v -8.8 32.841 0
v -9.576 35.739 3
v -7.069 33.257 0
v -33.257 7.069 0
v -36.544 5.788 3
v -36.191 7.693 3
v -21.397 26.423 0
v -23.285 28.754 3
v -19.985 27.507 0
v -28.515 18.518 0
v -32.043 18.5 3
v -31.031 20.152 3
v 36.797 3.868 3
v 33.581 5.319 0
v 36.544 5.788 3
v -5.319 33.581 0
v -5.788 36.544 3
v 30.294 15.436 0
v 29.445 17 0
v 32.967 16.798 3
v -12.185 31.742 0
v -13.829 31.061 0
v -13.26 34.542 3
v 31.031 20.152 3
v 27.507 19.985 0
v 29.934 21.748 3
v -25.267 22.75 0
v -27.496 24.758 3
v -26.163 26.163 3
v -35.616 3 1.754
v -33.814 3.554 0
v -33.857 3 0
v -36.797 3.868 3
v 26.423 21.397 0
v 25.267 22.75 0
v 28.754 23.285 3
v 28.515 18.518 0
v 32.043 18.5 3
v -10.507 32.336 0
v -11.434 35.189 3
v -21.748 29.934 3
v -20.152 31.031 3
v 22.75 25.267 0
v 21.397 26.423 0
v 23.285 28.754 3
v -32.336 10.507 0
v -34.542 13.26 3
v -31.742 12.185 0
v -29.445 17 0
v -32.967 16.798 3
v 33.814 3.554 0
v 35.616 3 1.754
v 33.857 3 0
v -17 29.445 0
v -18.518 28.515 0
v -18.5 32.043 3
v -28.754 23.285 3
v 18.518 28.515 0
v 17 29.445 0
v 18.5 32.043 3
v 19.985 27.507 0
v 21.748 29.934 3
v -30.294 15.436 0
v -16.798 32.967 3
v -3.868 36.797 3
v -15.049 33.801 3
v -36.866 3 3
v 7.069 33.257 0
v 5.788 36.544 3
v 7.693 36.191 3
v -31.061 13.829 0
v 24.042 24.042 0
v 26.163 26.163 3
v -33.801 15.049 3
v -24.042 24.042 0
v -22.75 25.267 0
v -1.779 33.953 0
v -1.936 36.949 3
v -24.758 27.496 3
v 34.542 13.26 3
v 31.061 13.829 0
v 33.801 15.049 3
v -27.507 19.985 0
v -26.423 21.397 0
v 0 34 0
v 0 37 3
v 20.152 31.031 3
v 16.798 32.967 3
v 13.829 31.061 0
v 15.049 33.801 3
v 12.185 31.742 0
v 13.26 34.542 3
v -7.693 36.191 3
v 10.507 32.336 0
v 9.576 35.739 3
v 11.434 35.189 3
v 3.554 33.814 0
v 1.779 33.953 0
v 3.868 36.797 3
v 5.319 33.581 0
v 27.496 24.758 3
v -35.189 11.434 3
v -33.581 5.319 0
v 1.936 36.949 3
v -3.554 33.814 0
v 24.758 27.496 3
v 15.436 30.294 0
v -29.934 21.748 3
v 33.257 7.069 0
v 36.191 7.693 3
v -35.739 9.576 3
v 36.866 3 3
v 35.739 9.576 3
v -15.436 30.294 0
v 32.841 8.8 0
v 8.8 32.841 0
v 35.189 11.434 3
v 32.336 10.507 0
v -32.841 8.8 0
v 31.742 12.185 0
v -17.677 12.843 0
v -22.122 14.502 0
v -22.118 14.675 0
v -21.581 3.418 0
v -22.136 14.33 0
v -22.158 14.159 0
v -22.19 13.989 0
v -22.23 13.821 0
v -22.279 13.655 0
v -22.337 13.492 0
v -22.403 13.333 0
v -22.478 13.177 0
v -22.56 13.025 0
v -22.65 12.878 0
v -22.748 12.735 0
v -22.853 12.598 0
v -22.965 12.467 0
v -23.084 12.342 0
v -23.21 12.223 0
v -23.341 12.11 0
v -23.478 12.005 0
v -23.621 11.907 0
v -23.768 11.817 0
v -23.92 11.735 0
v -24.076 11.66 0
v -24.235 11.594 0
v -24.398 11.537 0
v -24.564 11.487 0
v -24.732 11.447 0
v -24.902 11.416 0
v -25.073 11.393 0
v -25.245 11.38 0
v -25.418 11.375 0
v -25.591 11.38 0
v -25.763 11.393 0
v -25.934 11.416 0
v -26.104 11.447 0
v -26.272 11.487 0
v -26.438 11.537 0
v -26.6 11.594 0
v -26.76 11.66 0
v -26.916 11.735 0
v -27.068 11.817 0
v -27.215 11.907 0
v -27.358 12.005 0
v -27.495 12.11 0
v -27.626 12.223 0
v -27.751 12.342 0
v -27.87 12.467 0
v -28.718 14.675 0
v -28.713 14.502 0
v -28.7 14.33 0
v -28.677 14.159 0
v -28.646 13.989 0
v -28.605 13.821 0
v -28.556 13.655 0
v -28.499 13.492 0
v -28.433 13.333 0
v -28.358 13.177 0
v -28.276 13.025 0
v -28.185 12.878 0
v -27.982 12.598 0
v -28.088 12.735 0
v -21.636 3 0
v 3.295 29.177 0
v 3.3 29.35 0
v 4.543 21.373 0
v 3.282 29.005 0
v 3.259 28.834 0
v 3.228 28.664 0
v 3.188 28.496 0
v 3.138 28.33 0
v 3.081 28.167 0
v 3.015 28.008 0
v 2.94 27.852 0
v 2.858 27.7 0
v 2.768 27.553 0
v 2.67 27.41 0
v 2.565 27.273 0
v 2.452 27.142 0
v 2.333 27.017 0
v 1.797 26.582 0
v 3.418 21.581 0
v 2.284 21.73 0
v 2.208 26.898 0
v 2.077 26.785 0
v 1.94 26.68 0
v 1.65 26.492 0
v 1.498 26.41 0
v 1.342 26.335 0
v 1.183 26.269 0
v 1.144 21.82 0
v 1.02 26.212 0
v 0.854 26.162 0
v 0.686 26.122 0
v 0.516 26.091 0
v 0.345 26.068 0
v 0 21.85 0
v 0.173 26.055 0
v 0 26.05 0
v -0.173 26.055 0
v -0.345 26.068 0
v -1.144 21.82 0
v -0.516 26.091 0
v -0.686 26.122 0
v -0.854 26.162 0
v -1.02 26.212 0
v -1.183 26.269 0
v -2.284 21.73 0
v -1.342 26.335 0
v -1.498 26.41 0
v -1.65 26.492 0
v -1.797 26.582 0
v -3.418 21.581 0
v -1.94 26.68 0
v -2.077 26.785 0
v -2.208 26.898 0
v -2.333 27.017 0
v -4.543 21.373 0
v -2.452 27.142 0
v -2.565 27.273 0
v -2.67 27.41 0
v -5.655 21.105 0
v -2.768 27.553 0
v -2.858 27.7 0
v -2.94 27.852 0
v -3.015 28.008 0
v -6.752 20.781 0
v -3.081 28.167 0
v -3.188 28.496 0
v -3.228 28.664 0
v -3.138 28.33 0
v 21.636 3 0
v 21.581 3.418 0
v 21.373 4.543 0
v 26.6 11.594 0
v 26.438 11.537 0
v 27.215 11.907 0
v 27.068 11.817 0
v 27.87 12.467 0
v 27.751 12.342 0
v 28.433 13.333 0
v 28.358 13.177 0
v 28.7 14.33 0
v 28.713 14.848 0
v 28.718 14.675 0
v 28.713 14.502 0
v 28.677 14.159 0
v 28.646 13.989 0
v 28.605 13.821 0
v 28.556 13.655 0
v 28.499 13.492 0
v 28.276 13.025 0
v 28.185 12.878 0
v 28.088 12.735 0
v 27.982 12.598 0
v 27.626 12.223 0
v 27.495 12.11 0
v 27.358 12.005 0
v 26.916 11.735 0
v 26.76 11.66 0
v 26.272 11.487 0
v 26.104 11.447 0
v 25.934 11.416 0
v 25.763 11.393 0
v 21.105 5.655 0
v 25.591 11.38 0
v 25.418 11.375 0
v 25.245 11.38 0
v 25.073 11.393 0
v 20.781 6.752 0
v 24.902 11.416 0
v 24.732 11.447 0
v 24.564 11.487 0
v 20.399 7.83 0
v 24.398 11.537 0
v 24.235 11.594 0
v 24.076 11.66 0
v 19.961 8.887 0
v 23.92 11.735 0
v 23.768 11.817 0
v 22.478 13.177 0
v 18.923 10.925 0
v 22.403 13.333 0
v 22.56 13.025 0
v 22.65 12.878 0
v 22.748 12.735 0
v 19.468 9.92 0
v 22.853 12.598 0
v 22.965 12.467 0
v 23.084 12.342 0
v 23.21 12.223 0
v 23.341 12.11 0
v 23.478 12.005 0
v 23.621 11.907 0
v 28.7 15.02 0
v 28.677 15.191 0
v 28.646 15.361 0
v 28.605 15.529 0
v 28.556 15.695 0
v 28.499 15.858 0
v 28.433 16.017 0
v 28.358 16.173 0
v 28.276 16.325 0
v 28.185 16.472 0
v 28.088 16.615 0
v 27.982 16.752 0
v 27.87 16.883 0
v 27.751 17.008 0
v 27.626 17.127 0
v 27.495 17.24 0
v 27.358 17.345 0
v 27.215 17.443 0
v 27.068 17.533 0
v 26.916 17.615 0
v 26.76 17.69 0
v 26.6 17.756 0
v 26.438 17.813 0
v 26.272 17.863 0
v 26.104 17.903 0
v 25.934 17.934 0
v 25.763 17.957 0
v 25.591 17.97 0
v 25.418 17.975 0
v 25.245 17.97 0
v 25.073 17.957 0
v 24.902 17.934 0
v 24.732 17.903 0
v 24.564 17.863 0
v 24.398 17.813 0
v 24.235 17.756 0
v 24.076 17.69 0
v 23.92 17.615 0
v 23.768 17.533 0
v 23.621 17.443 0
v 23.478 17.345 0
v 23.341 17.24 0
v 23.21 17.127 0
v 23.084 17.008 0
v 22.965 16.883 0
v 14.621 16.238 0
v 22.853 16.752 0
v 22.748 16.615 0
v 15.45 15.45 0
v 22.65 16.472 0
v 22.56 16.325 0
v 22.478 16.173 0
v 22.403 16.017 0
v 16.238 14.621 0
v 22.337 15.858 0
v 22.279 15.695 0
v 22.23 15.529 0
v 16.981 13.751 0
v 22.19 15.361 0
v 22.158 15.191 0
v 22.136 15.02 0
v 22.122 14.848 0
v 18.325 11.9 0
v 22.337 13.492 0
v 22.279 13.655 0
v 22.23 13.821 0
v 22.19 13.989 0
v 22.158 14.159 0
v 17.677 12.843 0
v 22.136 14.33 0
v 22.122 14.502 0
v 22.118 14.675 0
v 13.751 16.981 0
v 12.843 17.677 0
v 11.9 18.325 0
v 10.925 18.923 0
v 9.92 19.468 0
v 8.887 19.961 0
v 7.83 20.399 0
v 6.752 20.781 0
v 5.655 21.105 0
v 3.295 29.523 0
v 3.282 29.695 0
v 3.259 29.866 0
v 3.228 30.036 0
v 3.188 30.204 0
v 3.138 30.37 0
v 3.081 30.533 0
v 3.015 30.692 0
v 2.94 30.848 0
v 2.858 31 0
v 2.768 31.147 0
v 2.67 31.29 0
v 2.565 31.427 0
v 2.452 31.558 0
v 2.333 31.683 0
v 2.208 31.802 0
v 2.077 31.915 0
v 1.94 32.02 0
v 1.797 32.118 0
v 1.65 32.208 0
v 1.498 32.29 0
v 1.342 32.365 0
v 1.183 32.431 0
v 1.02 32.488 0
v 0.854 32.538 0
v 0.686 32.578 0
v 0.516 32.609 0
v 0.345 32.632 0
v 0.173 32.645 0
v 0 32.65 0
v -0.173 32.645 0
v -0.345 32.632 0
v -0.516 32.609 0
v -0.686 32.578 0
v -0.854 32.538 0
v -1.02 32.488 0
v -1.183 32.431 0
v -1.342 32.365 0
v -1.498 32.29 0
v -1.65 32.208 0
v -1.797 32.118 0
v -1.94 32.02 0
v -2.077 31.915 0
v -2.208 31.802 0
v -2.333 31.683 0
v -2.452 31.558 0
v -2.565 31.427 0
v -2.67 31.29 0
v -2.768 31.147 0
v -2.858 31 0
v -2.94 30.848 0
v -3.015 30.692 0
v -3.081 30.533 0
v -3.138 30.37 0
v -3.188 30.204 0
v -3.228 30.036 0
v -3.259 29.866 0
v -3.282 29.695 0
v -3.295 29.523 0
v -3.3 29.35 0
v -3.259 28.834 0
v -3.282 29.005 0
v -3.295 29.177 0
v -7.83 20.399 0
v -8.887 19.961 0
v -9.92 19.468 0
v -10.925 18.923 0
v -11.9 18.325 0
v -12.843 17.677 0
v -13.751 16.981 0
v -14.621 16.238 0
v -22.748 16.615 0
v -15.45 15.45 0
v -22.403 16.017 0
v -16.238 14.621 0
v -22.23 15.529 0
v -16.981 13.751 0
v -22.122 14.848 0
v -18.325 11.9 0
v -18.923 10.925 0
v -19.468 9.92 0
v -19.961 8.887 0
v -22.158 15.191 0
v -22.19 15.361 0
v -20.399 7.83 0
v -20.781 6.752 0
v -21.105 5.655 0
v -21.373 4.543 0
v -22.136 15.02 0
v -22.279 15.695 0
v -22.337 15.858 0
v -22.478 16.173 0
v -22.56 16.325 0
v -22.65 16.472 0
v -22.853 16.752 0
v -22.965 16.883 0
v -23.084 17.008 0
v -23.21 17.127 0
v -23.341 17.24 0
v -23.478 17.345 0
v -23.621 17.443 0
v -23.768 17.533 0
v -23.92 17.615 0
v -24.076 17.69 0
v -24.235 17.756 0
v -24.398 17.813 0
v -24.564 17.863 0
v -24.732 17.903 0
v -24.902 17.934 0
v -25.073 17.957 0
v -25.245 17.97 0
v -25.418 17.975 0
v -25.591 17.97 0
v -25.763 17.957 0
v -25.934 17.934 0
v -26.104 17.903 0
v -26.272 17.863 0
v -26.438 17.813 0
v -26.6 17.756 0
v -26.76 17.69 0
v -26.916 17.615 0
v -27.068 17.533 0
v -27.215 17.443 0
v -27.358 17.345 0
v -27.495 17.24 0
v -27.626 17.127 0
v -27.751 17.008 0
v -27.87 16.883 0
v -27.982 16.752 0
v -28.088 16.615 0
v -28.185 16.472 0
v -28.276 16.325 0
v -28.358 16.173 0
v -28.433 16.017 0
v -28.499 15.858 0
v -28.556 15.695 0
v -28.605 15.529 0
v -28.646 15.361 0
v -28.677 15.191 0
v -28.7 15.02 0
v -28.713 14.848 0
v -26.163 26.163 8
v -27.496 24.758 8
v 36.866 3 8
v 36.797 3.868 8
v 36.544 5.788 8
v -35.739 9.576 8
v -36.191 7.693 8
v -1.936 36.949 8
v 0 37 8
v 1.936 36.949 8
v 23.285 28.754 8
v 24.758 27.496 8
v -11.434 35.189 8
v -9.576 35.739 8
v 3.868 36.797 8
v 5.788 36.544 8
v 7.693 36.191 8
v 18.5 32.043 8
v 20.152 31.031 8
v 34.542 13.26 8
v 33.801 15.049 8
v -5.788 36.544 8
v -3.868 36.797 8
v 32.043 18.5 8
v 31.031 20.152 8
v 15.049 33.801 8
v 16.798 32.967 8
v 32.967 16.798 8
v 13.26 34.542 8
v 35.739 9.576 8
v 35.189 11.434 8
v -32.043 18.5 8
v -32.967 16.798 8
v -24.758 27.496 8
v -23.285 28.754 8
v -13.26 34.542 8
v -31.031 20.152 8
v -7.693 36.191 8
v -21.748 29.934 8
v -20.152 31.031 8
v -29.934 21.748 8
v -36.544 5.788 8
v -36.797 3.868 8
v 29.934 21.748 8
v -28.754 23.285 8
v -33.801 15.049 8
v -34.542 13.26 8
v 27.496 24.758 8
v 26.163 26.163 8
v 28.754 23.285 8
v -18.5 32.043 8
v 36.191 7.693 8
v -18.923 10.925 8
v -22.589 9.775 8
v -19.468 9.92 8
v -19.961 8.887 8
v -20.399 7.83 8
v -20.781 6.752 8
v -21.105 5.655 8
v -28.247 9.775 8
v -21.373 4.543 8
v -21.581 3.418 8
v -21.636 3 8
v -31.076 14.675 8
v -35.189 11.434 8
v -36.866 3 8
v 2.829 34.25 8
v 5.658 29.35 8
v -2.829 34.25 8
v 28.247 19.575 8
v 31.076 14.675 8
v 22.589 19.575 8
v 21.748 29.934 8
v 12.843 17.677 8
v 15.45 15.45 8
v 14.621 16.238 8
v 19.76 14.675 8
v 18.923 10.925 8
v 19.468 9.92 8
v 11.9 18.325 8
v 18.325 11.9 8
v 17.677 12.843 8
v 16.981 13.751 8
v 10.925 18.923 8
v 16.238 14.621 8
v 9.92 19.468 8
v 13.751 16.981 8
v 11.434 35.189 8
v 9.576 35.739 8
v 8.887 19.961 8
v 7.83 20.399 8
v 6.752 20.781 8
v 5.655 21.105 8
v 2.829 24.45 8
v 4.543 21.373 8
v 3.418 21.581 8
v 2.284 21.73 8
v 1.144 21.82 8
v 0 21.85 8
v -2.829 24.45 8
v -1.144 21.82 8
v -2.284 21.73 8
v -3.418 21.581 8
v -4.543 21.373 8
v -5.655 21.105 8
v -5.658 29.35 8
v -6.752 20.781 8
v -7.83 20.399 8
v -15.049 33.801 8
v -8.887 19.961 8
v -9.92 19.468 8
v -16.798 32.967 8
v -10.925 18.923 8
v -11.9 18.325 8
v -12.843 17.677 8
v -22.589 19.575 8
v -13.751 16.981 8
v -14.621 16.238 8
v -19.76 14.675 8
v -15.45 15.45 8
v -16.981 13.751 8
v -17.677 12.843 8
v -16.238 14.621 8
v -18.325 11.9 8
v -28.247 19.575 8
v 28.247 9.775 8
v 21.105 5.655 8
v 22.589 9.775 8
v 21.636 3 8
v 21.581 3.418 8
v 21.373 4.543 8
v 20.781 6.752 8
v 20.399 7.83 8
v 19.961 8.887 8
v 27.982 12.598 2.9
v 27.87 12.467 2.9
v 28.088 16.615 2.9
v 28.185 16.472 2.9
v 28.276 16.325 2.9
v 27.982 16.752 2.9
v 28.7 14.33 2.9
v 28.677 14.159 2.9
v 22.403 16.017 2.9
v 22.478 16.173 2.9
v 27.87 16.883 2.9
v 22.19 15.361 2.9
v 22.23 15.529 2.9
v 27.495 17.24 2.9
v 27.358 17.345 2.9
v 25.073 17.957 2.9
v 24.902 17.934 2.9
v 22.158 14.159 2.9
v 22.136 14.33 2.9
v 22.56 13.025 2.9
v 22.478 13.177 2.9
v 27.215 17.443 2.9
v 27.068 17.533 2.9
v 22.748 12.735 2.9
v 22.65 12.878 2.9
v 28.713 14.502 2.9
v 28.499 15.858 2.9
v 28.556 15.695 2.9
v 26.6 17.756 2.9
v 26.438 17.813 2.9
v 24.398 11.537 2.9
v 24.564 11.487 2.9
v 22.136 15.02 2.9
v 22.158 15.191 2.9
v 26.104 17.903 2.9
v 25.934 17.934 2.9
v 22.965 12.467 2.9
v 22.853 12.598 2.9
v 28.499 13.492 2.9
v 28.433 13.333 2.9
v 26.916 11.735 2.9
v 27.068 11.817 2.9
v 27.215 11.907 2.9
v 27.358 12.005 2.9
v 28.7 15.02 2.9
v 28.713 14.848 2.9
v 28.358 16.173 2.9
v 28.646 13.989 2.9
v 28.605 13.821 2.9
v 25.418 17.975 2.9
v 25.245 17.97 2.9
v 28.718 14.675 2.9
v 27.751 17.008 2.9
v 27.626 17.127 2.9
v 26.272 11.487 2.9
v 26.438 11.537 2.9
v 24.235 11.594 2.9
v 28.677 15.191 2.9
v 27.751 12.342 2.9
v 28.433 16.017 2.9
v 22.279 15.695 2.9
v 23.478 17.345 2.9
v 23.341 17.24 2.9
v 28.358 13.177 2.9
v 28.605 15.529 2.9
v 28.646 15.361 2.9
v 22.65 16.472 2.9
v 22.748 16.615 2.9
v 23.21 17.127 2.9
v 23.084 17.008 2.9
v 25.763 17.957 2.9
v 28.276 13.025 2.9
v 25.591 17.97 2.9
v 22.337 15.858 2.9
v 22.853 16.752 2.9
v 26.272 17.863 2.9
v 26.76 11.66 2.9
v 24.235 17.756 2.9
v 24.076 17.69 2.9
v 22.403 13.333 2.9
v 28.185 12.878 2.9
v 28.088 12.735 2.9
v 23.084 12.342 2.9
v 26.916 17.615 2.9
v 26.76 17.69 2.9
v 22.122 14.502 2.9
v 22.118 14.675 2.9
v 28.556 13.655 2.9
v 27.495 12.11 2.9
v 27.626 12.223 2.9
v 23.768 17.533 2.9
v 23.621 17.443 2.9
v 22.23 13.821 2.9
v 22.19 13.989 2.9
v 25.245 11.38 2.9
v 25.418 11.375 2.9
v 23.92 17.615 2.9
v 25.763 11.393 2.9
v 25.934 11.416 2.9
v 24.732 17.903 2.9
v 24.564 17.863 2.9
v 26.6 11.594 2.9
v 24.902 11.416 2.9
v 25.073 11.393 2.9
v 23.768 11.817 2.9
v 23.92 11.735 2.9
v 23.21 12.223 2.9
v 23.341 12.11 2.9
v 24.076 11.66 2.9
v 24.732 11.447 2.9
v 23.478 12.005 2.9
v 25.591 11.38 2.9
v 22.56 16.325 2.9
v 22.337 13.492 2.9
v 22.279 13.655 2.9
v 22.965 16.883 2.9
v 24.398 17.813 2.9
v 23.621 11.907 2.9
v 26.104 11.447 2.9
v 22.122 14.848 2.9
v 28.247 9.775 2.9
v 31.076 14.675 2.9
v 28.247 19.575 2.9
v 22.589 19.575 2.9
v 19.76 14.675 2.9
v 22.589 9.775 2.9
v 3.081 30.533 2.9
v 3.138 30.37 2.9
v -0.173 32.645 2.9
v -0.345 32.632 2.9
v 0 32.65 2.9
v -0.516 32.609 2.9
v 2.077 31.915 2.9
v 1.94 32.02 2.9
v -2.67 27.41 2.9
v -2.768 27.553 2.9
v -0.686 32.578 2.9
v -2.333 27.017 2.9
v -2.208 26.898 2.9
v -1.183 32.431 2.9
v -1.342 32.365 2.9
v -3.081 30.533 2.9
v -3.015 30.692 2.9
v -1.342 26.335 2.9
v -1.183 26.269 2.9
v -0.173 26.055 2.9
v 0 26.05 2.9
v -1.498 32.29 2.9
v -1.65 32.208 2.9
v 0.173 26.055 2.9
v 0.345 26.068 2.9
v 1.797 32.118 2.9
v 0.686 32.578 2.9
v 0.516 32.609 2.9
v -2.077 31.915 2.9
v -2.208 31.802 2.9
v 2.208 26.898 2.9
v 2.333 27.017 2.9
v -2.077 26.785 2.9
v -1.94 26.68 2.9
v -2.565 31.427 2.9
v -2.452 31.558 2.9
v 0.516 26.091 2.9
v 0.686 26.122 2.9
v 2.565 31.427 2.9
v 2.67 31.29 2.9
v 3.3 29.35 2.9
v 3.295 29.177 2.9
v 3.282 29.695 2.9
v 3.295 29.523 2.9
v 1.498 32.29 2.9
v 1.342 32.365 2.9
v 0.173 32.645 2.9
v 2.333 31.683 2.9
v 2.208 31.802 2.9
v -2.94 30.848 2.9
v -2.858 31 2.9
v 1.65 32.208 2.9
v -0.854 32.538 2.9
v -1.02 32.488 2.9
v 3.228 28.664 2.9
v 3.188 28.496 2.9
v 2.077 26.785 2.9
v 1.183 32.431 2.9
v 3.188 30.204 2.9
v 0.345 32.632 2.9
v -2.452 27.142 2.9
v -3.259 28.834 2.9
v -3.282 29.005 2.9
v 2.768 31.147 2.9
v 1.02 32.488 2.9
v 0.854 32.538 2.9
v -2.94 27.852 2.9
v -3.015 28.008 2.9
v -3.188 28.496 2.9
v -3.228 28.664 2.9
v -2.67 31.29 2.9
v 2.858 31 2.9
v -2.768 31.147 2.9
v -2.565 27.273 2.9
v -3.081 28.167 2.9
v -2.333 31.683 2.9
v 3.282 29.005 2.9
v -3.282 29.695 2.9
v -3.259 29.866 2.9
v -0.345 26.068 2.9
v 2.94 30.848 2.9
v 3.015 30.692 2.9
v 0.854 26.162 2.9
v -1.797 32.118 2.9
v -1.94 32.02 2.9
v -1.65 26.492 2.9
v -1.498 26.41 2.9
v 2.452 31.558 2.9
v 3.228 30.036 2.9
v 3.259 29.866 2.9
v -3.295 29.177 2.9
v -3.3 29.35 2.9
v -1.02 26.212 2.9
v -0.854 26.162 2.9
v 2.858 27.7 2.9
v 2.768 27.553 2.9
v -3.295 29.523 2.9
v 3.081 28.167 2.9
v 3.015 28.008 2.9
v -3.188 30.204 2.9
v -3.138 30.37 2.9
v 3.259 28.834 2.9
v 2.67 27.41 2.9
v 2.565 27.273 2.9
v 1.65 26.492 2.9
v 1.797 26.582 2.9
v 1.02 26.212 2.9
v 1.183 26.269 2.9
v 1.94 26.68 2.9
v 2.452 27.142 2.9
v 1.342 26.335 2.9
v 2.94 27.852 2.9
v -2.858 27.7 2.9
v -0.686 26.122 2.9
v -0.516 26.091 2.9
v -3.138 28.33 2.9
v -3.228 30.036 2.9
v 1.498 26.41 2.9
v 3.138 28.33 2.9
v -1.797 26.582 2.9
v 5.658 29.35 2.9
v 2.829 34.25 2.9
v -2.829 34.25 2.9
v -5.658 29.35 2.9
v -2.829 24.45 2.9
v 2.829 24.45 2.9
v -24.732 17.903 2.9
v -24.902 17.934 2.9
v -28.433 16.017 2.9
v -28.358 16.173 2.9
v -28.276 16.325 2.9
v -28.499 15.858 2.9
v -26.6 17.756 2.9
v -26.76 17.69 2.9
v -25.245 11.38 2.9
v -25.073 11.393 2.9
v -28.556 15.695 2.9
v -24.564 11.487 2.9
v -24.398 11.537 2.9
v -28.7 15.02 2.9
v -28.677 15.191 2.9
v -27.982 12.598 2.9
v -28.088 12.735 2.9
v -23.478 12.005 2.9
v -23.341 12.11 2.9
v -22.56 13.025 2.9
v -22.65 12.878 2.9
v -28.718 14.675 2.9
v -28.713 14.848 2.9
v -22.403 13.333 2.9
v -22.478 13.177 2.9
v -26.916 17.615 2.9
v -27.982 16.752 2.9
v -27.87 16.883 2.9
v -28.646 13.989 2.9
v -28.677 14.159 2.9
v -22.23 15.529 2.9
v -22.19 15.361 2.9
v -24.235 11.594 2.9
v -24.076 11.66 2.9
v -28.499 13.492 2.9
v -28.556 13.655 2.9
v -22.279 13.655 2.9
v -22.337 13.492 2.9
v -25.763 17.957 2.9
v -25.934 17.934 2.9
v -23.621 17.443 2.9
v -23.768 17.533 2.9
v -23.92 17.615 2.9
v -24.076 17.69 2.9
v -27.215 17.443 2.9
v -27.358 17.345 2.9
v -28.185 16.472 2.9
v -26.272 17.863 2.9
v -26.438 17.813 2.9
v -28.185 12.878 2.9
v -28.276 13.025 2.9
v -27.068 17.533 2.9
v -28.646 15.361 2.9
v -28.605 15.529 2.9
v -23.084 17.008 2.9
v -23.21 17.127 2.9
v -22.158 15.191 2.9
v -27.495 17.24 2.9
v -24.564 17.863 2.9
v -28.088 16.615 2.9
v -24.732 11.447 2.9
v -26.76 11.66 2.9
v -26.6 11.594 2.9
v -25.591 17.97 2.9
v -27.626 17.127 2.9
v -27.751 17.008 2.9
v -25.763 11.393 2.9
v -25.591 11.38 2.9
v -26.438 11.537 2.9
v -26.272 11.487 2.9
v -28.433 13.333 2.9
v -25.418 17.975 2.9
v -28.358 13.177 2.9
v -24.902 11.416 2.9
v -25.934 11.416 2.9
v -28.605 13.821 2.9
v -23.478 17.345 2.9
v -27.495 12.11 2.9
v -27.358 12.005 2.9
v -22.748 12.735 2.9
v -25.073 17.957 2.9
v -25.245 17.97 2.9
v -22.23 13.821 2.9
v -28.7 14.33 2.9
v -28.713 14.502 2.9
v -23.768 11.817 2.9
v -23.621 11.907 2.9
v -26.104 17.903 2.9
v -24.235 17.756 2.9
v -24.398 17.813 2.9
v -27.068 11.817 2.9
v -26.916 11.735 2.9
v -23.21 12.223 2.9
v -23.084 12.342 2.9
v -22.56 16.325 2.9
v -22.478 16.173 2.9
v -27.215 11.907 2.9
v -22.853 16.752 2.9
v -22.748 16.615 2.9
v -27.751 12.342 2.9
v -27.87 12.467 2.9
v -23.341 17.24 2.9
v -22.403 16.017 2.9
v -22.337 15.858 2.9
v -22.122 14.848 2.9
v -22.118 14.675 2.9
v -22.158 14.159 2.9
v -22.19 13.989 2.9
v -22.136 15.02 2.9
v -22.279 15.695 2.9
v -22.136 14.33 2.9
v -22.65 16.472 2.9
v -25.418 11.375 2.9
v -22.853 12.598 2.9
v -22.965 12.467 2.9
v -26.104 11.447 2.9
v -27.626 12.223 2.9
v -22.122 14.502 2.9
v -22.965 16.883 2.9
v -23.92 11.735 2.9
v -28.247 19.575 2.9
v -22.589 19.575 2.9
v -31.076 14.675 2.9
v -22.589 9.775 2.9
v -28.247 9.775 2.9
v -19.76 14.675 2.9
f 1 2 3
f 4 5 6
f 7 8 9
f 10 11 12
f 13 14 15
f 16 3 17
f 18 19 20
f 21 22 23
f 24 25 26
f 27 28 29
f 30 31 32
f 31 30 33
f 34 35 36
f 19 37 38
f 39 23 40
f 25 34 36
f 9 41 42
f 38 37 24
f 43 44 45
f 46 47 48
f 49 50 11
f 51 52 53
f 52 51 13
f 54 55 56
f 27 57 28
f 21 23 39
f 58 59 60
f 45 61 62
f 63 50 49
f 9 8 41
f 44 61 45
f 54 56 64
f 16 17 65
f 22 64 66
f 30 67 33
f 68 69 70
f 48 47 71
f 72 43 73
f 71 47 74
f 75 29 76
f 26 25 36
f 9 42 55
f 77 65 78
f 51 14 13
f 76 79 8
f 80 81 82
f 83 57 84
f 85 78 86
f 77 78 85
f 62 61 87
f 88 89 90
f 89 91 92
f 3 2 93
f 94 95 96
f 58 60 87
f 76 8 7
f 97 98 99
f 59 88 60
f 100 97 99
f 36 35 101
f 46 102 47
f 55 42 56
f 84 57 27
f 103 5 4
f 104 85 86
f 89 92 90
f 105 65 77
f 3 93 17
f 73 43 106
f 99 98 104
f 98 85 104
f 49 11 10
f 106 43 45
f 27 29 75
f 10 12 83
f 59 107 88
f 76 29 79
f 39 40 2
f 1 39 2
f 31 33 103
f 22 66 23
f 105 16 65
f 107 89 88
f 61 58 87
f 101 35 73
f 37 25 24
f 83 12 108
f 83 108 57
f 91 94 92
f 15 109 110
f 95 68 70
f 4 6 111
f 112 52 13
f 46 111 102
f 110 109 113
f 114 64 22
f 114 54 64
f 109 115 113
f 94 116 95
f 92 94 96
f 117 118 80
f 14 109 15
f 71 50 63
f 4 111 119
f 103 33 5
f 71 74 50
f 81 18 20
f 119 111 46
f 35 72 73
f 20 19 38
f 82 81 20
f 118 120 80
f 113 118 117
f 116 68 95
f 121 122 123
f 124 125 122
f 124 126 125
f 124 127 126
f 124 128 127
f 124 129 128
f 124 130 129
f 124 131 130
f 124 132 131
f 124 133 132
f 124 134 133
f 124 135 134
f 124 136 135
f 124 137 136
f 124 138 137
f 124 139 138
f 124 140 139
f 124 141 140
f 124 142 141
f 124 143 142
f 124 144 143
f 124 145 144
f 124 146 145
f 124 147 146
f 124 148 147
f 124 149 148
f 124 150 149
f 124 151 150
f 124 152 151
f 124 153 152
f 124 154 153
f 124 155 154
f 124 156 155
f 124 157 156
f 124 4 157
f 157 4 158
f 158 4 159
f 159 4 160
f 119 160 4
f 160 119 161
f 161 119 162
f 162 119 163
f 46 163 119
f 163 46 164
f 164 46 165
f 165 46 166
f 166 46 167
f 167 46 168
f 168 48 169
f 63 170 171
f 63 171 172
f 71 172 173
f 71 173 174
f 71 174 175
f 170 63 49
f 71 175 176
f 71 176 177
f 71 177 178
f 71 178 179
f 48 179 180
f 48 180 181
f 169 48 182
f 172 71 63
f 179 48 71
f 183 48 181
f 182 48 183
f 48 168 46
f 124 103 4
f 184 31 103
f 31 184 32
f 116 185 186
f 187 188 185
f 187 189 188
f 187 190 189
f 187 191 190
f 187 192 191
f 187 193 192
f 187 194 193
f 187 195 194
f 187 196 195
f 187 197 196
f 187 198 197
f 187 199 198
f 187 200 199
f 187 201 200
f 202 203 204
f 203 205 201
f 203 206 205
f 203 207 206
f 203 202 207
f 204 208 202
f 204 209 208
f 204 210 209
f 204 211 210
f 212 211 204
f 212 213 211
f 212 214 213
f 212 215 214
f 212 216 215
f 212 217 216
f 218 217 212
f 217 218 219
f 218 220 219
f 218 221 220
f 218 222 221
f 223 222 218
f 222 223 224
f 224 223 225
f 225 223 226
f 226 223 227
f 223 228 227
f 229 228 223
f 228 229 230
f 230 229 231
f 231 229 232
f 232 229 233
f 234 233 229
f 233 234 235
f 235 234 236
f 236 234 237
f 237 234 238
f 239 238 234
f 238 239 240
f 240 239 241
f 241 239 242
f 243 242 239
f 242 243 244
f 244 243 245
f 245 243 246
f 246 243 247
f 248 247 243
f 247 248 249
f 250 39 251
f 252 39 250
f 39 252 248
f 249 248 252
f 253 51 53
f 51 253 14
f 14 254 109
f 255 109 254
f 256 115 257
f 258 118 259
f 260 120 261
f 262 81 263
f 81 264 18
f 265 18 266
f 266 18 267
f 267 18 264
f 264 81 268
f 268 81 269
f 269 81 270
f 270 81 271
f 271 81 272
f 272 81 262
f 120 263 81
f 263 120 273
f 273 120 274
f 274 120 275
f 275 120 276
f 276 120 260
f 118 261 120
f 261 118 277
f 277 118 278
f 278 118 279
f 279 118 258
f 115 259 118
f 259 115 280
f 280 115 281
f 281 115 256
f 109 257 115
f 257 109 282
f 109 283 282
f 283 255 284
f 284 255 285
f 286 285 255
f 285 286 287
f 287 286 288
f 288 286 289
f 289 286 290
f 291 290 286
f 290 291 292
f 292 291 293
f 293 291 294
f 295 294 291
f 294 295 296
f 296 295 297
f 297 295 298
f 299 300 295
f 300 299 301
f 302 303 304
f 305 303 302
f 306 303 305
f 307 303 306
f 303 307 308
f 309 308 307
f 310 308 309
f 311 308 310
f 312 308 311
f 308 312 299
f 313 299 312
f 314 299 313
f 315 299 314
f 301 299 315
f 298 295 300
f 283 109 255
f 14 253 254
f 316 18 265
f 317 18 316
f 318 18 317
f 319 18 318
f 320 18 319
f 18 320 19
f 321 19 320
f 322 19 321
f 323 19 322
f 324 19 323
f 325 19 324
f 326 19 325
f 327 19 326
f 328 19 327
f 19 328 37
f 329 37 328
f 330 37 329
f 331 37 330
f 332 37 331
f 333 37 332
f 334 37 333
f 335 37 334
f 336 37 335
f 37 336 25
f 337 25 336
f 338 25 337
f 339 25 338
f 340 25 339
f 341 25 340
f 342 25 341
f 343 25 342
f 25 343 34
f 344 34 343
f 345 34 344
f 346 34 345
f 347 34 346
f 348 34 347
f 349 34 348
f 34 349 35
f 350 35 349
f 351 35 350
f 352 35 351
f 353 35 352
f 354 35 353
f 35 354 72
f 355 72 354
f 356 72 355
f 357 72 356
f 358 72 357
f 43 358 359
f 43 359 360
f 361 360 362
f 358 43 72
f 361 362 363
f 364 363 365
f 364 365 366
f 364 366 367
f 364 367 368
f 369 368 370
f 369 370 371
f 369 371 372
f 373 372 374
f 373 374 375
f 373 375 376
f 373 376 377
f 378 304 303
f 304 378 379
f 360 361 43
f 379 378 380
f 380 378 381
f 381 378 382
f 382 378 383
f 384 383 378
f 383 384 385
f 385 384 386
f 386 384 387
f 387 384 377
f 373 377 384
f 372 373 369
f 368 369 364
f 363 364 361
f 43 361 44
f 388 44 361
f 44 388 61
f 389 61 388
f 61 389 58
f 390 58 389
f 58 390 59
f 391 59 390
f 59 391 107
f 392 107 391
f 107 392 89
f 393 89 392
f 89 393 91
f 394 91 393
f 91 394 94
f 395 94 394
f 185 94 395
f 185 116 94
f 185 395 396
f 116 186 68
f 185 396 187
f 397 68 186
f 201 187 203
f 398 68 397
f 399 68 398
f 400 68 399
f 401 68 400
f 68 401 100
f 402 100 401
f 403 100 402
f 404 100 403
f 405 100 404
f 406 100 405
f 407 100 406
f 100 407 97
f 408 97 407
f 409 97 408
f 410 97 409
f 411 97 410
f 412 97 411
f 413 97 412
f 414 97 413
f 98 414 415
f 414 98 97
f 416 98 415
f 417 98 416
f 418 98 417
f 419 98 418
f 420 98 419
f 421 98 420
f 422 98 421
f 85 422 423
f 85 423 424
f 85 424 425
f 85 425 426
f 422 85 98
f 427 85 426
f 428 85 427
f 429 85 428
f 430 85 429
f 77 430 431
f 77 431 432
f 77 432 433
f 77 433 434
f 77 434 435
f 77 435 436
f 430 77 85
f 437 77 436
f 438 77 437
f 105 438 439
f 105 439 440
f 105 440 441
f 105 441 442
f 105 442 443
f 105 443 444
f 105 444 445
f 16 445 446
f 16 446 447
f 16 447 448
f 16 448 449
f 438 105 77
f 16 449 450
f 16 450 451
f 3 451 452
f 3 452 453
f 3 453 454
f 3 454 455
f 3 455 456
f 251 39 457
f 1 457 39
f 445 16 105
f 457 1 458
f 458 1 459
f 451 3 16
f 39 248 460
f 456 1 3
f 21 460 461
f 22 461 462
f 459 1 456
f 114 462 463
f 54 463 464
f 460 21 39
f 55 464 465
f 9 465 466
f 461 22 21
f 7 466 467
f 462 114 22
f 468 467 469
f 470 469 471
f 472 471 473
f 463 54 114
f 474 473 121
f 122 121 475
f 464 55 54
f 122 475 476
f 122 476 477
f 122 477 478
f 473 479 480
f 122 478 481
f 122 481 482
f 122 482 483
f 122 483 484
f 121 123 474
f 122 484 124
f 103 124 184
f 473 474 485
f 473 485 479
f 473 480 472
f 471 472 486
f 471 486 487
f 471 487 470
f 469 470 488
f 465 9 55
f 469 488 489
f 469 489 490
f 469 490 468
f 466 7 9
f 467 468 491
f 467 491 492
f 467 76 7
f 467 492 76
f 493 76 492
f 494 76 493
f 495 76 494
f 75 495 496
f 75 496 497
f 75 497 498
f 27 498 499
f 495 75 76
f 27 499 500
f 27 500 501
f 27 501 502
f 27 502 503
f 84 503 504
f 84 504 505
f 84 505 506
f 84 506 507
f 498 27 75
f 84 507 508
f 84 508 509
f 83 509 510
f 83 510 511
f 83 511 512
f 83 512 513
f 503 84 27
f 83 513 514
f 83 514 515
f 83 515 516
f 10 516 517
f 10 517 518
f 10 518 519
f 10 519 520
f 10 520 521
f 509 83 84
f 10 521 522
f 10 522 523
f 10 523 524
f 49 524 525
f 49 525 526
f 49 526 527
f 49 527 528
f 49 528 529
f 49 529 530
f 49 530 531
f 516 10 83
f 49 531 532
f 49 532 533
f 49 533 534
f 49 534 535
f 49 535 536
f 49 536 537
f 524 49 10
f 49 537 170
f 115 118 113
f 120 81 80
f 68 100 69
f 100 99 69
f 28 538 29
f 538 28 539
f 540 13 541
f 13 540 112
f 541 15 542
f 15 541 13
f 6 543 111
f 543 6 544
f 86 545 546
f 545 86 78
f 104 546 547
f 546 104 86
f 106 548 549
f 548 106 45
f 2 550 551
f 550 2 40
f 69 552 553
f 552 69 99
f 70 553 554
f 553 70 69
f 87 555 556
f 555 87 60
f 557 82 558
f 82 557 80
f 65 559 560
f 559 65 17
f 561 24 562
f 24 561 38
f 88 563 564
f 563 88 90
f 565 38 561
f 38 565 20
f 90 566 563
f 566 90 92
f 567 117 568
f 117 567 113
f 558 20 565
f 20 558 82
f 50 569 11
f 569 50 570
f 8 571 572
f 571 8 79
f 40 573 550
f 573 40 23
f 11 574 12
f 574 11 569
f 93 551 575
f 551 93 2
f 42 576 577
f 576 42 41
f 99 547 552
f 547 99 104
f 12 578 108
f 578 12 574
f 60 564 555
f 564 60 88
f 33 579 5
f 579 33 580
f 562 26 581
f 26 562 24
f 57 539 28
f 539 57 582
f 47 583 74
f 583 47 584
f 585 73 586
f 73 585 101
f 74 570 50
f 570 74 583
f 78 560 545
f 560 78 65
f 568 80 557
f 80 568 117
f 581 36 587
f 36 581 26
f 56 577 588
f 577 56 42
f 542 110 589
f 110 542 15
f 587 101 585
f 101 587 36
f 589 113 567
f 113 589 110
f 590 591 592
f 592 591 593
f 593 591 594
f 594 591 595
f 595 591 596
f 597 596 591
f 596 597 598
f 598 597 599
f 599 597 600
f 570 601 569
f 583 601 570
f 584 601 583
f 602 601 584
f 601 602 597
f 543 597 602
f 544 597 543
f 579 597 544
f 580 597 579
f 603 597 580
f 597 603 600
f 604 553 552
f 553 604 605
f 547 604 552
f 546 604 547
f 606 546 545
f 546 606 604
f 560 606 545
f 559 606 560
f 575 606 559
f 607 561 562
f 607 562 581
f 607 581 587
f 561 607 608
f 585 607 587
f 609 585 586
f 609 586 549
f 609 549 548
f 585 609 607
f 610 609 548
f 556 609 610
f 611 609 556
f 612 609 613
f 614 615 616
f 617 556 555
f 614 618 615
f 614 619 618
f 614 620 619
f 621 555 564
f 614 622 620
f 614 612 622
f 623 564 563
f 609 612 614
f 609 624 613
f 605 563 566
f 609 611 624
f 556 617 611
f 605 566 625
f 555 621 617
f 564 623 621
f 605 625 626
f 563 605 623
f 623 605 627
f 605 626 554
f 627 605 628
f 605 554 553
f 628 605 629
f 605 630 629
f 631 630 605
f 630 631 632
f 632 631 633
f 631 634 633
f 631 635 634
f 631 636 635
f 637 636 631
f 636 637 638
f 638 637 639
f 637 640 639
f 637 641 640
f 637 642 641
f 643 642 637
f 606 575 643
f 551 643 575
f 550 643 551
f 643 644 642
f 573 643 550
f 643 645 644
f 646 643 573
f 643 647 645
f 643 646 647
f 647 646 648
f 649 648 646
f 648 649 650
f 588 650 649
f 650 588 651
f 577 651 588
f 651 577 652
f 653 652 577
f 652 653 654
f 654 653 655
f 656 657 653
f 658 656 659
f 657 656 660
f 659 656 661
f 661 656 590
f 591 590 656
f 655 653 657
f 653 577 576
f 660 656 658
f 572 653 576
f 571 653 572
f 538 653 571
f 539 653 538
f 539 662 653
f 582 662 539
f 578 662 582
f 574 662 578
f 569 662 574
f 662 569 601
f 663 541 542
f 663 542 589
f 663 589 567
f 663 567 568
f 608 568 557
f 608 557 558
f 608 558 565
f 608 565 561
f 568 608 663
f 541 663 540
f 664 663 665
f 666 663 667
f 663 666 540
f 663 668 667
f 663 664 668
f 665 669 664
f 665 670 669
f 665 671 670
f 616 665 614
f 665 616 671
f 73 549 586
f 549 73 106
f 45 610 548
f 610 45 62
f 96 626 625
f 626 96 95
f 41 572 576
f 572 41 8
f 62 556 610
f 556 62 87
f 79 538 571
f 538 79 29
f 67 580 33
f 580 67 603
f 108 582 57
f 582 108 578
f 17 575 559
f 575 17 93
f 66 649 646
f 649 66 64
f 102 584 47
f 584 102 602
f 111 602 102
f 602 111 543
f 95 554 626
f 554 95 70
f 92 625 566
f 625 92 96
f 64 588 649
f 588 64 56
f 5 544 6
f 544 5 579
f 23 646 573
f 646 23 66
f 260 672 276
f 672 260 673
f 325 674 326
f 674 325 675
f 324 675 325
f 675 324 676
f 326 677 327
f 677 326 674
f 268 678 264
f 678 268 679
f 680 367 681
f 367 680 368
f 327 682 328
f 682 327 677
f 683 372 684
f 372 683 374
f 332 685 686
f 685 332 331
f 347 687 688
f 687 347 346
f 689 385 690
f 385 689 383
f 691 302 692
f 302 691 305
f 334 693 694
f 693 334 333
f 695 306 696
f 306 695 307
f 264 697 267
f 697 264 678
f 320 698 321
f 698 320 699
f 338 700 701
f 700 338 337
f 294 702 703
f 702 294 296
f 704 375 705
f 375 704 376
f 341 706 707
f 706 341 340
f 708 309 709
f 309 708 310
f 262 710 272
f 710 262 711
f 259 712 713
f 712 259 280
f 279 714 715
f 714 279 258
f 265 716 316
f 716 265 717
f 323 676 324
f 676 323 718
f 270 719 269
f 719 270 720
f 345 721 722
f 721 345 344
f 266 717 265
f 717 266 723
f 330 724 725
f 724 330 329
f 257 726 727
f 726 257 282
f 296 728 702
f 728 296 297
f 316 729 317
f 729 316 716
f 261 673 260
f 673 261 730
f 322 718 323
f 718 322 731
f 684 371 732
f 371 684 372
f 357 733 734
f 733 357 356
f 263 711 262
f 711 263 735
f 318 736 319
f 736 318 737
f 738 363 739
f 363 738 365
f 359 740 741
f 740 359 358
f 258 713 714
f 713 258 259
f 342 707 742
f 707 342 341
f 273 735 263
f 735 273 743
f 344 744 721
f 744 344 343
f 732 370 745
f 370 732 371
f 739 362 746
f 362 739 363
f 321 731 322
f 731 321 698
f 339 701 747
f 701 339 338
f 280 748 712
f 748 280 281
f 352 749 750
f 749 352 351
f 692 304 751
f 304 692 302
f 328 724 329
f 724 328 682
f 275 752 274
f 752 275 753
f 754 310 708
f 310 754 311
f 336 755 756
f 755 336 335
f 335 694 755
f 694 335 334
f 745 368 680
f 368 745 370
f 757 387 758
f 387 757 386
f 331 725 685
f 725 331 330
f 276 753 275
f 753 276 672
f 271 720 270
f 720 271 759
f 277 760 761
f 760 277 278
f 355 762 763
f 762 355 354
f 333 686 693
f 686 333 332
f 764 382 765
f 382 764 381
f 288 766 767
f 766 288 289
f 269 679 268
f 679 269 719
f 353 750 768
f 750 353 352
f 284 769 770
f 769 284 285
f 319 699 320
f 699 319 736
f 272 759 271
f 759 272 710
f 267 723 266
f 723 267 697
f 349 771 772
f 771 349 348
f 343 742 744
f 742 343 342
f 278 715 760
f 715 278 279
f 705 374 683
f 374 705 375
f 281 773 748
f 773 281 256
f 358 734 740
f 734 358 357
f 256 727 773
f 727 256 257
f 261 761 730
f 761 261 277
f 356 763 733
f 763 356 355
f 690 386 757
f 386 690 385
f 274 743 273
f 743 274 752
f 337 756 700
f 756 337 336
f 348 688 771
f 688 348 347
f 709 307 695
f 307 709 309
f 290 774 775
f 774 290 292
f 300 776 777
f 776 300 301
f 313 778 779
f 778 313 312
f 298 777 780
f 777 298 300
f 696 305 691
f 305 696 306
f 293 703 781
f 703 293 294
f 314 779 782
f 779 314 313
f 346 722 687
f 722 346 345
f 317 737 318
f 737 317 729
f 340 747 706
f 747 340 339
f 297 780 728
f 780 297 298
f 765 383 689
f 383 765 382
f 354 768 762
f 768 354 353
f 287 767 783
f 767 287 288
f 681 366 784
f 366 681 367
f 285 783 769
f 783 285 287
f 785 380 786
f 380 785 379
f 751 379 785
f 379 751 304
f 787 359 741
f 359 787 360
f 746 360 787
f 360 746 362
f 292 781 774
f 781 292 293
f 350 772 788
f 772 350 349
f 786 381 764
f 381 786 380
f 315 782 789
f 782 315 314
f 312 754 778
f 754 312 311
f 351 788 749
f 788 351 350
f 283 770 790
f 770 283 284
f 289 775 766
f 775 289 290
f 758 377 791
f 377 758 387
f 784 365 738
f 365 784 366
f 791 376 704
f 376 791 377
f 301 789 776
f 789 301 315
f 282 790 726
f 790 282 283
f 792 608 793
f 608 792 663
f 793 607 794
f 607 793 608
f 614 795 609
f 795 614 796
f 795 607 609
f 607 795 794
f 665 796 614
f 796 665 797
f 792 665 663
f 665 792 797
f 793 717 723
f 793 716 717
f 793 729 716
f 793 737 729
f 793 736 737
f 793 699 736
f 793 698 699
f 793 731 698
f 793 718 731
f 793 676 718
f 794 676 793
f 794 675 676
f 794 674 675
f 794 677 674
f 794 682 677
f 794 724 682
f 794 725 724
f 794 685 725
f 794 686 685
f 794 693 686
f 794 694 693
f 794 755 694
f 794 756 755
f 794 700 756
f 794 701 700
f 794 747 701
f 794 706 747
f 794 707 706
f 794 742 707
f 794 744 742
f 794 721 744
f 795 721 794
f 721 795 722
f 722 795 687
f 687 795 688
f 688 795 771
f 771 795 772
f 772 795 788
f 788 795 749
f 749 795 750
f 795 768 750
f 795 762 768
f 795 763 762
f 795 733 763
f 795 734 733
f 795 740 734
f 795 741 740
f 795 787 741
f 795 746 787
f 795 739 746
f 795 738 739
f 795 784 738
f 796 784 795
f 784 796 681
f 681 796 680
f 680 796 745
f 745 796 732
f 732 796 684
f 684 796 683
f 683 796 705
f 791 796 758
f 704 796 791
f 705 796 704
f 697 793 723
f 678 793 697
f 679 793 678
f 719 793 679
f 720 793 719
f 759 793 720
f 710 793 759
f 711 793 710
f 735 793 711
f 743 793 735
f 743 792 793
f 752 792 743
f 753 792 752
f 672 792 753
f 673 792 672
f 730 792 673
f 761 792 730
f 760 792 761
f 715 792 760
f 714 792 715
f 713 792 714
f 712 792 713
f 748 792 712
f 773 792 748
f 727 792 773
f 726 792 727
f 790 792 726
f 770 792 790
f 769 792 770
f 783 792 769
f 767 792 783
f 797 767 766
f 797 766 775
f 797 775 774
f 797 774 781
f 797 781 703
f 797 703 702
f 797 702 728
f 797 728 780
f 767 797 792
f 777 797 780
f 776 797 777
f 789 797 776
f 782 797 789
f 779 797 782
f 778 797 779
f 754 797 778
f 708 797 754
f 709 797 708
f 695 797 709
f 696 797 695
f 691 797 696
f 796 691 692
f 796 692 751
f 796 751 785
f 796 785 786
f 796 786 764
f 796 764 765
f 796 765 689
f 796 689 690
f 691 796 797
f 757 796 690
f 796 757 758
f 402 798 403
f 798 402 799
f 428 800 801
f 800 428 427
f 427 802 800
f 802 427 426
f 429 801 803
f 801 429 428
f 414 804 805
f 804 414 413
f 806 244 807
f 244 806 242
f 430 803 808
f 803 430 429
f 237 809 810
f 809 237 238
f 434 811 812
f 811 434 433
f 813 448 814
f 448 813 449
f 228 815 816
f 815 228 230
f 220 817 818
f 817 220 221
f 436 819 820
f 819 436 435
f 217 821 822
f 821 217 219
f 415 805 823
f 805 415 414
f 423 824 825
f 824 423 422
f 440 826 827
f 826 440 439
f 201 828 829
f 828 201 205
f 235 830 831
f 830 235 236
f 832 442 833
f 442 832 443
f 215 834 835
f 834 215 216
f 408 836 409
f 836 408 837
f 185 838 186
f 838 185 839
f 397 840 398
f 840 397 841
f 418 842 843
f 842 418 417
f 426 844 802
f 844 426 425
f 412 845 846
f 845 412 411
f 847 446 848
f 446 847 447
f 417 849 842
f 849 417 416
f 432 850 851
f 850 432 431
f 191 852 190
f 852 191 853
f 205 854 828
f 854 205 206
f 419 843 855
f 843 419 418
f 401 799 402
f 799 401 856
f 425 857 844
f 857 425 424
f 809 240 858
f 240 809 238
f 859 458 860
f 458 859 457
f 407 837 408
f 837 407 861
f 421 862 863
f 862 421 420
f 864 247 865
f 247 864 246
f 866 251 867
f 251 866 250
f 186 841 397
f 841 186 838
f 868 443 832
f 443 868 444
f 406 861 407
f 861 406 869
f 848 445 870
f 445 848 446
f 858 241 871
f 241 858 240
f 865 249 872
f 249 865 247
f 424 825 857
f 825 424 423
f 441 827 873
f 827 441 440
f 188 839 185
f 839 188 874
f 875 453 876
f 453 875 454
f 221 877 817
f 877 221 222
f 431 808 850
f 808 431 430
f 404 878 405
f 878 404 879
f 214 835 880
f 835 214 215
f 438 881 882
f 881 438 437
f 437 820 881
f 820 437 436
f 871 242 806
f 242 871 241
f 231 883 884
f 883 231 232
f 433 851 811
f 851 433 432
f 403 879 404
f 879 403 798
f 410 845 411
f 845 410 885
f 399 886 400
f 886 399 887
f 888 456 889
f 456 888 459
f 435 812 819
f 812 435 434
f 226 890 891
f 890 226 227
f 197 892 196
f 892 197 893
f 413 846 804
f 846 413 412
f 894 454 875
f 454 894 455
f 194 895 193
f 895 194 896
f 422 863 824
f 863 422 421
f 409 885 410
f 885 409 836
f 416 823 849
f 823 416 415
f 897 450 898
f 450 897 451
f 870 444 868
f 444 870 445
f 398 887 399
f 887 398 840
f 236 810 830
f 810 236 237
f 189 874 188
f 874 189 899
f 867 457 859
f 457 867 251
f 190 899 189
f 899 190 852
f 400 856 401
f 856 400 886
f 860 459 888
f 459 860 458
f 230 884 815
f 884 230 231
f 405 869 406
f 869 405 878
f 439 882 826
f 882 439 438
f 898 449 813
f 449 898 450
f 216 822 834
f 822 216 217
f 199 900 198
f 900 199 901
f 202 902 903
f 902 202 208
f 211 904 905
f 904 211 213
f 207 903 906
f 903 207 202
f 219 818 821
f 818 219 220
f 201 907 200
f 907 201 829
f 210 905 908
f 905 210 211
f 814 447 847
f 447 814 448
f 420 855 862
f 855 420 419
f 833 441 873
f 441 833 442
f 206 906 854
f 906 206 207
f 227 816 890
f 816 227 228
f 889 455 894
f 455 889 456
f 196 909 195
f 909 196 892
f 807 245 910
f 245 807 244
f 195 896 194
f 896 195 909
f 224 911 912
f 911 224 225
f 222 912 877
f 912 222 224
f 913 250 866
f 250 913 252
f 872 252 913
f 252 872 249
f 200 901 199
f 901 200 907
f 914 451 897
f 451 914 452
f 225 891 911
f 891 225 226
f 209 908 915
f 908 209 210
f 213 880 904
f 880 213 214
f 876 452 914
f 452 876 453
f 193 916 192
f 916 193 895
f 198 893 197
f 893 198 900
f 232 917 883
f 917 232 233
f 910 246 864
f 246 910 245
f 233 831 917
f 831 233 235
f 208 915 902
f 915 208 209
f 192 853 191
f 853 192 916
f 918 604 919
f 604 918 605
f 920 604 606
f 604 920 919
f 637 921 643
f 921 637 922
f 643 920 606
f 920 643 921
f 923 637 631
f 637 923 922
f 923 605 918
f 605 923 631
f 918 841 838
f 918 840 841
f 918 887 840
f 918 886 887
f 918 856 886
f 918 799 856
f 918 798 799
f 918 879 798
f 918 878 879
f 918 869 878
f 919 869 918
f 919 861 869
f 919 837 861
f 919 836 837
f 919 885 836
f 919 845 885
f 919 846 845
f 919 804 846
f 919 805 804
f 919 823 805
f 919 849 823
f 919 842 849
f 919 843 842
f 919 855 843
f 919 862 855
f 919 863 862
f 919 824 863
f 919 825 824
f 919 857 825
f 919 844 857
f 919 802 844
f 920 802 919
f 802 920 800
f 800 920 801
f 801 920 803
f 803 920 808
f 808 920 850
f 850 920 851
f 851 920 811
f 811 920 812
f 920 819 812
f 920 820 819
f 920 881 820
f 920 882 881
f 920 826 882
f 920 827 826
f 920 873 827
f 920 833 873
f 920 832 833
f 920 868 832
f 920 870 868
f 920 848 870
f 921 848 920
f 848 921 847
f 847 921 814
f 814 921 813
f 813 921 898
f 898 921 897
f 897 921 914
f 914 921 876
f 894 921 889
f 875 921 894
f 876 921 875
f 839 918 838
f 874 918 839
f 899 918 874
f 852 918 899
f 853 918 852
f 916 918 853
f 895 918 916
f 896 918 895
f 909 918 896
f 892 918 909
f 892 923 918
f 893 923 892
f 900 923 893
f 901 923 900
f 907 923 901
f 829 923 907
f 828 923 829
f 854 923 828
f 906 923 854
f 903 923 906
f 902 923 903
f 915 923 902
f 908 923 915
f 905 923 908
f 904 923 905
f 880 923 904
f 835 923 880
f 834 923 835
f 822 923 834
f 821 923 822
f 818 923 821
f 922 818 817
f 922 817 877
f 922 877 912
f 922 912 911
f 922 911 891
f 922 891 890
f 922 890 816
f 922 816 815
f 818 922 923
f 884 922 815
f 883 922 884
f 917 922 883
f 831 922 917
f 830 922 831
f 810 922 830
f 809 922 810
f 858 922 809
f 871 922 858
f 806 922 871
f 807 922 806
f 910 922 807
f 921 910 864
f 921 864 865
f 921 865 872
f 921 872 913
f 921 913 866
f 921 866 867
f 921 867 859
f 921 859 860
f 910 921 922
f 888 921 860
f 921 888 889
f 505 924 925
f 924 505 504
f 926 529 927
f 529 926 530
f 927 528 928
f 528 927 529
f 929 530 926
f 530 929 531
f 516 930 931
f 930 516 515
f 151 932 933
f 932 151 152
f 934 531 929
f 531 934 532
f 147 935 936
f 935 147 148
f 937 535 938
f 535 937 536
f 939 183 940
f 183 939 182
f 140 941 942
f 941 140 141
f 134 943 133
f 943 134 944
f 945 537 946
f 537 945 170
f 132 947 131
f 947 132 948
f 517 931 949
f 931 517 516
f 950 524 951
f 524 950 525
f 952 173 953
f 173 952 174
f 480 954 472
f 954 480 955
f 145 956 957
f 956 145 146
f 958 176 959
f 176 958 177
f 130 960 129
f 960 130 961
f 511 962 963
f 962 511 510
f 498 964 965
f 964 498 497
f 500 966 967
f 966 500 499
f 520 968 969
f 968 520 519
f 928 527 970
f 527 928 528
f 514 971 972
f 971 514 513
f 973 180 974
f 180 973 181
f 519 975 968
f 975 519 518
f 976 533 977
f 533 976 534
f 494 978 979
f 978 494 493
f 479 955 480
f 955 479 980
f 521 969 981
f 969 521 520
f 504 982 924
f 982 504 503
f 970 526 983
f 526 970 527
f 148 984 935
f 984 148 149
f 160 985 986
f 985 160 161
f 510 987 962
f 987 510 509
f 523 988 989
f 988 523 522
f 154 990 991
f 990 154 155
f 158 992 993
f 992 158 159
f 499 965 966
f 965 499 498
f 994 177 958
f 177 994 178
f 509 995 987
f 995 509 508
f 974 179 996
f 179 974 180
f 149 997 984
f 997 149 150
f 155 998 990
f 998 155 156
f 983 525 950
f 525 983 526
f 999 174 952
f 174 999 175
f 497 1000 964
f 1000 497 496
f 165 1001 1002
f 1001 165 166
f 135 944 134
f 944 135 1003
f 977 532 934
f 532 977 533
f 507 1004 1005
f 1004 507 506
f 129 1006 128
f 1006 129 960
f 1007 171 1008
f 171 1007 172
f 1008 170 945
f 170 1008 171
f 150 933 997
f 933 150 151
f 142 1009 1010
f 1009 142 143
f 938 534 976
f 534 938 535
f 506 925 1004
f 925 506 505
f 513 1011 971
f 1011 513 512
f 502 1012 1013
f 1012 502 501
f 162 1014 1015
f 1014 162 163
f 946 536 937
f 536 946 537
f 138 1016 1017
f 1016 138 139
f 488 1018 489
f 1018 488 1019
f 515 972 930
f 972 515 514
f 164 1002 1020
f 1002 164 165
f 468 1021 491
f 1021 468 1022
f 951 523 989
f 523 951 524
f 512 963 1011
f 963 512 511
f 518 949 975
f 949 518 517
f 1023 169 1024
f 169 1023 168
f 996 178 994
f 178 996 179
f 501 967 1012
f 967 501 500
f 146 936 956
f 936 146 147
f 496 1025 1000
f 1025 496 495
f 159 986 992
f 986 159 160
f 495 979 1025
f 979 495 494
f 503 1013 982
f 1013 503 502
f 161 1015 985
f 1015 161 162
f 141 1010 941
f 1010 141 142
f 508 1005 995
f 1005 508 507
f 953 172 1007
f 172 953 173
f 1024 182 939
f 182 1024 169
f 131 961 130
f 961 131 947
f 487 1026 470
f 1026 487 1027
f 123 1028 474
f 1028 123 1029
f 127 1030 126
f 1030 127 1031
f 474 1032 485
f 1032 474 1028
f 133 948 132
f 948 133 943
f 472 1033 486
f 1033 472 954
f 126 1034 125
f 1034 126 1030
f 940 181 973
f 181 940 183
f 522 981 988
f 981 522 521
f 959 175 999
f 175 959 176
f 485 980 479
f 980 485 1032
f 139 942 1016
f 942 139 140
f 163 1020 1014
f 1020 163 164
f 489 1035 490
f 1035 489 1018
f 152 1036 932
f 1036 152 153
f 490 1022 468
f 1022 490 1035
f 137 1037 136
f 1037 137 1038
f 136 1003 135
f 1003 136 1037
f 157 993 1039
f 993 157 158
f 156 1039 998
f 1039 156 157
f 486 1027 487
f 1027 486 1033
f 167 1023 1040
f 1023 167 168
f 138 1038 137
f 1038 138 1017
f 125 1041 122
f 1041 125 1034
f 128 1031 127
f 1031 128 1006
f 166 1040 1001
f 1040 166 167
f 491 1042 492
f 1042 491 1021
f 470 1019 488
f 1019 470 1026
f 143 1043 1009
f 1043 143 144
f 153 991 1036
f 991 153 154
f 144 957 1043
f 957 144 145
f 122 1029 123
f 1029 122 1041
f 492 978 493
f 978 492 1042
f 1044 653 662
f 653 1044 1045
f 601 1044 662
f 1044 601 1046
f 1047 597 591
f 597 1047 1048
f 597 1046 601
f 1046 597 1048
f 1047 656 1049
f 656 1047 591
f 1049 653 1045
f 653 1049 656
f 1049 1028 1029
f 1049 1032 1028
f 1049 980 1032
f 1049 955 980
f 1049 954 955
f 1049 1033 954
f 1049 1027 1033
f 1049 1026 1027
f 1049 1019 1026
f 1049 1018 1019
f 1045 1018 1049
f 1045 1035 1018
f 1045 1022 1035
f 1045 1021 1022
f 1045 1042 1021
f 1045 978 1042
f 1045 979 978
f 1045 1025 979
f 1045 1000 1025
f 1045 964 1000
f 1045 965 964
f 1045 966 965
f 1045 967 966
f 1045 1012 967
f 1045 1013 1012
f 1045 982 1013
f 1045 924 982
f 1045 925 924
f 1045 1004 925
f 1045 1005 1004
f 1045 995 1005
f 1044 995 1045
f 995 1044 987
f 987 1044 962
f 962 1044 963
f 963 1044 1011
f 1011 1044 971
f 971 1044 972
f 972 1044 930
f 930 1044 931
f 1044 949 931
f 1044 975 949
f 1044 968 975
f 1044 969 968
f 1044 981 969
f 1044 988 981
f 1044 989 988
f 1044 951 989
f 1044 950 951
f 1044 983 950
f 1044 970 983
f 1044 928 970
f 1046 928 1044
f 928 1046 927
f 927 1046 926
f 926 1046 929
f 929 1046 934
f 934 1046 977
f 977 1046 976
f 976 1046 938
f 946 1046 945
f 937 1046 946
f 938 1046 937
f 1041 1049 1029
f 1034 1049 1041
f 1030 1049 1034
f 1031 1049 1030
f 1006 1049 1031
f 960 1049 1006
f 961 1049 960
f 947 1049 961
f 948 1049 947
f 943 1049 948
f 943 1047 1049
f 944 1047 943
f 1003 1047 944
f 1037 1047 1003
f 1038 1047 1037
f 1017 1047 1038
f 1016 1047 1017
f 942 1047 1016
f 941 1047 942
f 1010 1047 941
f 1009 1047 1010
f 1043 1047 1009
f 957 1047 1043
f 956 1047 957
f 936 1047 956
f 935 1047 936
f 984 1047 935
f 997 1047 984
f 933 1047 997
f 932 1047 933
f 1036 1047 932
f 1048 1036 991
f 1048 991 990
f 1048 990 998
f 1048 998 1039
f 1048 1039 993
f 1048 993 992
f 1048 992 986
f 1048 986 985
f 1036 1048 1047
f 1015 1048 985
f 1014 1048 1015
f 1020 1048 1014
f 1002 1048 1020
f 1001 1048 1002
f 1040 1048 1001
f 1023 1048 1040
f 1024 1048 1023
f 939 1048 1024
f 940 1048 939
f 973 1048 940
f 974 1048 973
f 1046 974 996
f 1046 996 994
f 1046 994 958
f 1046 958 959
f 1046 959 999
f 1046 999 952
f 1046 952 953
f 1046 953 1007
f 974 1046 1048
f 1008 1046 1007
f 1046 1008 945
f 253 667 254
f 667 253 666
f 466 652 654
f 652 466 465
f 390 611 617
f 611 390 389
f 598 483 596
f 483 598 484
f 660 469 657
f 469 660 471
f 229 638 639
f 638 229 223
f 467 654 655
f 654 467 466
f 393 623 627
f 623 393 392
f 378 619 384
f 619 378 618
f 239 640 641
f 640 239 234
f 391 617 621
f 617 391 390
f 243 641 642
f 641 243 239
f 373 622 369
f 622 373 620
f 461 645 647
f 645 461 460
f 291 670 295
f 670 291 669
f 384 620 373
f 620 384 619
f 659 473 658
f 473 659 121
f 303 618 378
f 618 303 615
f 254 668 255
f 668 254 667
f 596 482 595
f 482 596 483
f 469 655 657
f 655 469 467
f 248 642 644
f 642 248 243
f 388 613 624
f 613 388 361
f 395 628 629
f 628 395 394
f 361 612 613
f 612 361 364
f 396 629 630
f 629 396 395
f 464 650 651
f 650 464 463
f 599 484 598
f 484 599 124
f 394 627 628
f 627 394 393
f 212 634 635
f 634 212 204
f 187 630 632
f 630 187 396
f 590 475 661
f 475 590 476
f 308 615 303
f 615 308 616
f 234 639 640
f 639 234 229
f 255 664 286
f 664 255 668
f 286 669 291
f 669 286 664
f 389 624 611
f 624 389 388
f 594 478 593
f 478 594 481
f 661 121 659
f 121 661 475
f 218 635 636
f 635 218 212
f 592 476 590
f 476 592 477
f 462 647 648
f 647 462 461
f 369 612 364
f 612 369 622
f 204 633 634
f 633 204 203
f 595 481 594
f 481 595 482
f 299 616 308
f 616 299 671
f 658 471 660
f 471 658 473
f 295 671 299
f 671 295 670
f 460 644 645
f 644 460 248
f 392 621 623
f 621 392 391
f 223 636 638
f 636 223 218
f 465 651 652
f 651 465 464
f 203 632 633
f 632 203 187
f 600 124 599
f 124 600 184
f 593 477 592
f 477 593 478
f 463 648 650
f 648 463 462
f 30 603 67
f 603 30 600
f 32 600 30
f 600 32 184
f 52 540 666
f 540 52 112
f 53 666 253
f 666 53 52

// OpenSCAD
// This work is marked with CC0 1.0 Universal. 
// To view a copy of this license, visit http://creativecommons.org/publicdomain/zero/1.0/

// ==========================================
// PCD58.7mm 6H M6 Nut Holder (Half & Chamfered)
// ==========================================

// --- パラメータ設定 ---
$fn = 120;             // 解像度
pcd = 58.7;           // ピッチ円直径
num_holes = 6;        // 全周の穴数
nut_width = 9.8;     // M6ナット二面幅（公差込 10.3mm）
nut_depth = 5.2;      // ナットポケット深さ
bolt_hole = 6.6;      // ボルト貫通穴（公差込 6.6mm）
base_height = 8;     // 全体の厚み
outer_dia = 74.0;     // 外径
chamfer = 3.0;        // 45deg面取り幅

// --- 統合モジュール ---
intersection() {
    // 1. メインボディ構築
    difference() {
        // 本体形状：面取りを実現するために垂直部と円錐台を結合
        union() {
            cylinder(h = chamfer, d1 = outer_dia - (chamfer * 2), d2 = outer_dia);

            // 2. 上部の垂直セクション
            // 面取りの高さ分だけ上に移動させて結合
            translate([0, 0, chamfer])
            cylinder(h = base_height - chamfer, d = outer_dia);
        }

        // 中心穴（軽量化・軸合わせ）
        translate([0, 0, -0.1])
        cylinder(h = base_height + 0.2, d = pcd - 15);

        // PCD上の6個の穴とナットポケット
        for (i = [0 : num_holes - 1]) {
            angle = i * 360 / num_holes + 30;
            rotate([0, 0, angle])
            translate([pcd / 2, 0, 0]) {
                // ボルト貫通穴
                cylinder(h = base_height + 0.2, d = bolt_hole);
                // M6ナット回り止め（六角形）
                translate([0, 0, base_height - nut_depth + 0.1])
                rotate([0, 0, 30])
                cylinder(h = nut_depth, d = nut_width / cos(30), $fn = 6);
            }
        }
    }

    // 2. ハーフカット処理（Y領域の正の方向のみを抽出）
    // 外周に余裕を持たせたバウンディングボックス
    translate([-outer_dia, 3, -0.1])
    cube([outer_dia * 2, outer_dia, base_height + 0.2]);
}

// --- 補足：断面の角を丸めたい場合（オプション） ---
// 断面自体の角は鋭利なままですが、積層造形上の強度と安全性はこれで十分担保されます。
